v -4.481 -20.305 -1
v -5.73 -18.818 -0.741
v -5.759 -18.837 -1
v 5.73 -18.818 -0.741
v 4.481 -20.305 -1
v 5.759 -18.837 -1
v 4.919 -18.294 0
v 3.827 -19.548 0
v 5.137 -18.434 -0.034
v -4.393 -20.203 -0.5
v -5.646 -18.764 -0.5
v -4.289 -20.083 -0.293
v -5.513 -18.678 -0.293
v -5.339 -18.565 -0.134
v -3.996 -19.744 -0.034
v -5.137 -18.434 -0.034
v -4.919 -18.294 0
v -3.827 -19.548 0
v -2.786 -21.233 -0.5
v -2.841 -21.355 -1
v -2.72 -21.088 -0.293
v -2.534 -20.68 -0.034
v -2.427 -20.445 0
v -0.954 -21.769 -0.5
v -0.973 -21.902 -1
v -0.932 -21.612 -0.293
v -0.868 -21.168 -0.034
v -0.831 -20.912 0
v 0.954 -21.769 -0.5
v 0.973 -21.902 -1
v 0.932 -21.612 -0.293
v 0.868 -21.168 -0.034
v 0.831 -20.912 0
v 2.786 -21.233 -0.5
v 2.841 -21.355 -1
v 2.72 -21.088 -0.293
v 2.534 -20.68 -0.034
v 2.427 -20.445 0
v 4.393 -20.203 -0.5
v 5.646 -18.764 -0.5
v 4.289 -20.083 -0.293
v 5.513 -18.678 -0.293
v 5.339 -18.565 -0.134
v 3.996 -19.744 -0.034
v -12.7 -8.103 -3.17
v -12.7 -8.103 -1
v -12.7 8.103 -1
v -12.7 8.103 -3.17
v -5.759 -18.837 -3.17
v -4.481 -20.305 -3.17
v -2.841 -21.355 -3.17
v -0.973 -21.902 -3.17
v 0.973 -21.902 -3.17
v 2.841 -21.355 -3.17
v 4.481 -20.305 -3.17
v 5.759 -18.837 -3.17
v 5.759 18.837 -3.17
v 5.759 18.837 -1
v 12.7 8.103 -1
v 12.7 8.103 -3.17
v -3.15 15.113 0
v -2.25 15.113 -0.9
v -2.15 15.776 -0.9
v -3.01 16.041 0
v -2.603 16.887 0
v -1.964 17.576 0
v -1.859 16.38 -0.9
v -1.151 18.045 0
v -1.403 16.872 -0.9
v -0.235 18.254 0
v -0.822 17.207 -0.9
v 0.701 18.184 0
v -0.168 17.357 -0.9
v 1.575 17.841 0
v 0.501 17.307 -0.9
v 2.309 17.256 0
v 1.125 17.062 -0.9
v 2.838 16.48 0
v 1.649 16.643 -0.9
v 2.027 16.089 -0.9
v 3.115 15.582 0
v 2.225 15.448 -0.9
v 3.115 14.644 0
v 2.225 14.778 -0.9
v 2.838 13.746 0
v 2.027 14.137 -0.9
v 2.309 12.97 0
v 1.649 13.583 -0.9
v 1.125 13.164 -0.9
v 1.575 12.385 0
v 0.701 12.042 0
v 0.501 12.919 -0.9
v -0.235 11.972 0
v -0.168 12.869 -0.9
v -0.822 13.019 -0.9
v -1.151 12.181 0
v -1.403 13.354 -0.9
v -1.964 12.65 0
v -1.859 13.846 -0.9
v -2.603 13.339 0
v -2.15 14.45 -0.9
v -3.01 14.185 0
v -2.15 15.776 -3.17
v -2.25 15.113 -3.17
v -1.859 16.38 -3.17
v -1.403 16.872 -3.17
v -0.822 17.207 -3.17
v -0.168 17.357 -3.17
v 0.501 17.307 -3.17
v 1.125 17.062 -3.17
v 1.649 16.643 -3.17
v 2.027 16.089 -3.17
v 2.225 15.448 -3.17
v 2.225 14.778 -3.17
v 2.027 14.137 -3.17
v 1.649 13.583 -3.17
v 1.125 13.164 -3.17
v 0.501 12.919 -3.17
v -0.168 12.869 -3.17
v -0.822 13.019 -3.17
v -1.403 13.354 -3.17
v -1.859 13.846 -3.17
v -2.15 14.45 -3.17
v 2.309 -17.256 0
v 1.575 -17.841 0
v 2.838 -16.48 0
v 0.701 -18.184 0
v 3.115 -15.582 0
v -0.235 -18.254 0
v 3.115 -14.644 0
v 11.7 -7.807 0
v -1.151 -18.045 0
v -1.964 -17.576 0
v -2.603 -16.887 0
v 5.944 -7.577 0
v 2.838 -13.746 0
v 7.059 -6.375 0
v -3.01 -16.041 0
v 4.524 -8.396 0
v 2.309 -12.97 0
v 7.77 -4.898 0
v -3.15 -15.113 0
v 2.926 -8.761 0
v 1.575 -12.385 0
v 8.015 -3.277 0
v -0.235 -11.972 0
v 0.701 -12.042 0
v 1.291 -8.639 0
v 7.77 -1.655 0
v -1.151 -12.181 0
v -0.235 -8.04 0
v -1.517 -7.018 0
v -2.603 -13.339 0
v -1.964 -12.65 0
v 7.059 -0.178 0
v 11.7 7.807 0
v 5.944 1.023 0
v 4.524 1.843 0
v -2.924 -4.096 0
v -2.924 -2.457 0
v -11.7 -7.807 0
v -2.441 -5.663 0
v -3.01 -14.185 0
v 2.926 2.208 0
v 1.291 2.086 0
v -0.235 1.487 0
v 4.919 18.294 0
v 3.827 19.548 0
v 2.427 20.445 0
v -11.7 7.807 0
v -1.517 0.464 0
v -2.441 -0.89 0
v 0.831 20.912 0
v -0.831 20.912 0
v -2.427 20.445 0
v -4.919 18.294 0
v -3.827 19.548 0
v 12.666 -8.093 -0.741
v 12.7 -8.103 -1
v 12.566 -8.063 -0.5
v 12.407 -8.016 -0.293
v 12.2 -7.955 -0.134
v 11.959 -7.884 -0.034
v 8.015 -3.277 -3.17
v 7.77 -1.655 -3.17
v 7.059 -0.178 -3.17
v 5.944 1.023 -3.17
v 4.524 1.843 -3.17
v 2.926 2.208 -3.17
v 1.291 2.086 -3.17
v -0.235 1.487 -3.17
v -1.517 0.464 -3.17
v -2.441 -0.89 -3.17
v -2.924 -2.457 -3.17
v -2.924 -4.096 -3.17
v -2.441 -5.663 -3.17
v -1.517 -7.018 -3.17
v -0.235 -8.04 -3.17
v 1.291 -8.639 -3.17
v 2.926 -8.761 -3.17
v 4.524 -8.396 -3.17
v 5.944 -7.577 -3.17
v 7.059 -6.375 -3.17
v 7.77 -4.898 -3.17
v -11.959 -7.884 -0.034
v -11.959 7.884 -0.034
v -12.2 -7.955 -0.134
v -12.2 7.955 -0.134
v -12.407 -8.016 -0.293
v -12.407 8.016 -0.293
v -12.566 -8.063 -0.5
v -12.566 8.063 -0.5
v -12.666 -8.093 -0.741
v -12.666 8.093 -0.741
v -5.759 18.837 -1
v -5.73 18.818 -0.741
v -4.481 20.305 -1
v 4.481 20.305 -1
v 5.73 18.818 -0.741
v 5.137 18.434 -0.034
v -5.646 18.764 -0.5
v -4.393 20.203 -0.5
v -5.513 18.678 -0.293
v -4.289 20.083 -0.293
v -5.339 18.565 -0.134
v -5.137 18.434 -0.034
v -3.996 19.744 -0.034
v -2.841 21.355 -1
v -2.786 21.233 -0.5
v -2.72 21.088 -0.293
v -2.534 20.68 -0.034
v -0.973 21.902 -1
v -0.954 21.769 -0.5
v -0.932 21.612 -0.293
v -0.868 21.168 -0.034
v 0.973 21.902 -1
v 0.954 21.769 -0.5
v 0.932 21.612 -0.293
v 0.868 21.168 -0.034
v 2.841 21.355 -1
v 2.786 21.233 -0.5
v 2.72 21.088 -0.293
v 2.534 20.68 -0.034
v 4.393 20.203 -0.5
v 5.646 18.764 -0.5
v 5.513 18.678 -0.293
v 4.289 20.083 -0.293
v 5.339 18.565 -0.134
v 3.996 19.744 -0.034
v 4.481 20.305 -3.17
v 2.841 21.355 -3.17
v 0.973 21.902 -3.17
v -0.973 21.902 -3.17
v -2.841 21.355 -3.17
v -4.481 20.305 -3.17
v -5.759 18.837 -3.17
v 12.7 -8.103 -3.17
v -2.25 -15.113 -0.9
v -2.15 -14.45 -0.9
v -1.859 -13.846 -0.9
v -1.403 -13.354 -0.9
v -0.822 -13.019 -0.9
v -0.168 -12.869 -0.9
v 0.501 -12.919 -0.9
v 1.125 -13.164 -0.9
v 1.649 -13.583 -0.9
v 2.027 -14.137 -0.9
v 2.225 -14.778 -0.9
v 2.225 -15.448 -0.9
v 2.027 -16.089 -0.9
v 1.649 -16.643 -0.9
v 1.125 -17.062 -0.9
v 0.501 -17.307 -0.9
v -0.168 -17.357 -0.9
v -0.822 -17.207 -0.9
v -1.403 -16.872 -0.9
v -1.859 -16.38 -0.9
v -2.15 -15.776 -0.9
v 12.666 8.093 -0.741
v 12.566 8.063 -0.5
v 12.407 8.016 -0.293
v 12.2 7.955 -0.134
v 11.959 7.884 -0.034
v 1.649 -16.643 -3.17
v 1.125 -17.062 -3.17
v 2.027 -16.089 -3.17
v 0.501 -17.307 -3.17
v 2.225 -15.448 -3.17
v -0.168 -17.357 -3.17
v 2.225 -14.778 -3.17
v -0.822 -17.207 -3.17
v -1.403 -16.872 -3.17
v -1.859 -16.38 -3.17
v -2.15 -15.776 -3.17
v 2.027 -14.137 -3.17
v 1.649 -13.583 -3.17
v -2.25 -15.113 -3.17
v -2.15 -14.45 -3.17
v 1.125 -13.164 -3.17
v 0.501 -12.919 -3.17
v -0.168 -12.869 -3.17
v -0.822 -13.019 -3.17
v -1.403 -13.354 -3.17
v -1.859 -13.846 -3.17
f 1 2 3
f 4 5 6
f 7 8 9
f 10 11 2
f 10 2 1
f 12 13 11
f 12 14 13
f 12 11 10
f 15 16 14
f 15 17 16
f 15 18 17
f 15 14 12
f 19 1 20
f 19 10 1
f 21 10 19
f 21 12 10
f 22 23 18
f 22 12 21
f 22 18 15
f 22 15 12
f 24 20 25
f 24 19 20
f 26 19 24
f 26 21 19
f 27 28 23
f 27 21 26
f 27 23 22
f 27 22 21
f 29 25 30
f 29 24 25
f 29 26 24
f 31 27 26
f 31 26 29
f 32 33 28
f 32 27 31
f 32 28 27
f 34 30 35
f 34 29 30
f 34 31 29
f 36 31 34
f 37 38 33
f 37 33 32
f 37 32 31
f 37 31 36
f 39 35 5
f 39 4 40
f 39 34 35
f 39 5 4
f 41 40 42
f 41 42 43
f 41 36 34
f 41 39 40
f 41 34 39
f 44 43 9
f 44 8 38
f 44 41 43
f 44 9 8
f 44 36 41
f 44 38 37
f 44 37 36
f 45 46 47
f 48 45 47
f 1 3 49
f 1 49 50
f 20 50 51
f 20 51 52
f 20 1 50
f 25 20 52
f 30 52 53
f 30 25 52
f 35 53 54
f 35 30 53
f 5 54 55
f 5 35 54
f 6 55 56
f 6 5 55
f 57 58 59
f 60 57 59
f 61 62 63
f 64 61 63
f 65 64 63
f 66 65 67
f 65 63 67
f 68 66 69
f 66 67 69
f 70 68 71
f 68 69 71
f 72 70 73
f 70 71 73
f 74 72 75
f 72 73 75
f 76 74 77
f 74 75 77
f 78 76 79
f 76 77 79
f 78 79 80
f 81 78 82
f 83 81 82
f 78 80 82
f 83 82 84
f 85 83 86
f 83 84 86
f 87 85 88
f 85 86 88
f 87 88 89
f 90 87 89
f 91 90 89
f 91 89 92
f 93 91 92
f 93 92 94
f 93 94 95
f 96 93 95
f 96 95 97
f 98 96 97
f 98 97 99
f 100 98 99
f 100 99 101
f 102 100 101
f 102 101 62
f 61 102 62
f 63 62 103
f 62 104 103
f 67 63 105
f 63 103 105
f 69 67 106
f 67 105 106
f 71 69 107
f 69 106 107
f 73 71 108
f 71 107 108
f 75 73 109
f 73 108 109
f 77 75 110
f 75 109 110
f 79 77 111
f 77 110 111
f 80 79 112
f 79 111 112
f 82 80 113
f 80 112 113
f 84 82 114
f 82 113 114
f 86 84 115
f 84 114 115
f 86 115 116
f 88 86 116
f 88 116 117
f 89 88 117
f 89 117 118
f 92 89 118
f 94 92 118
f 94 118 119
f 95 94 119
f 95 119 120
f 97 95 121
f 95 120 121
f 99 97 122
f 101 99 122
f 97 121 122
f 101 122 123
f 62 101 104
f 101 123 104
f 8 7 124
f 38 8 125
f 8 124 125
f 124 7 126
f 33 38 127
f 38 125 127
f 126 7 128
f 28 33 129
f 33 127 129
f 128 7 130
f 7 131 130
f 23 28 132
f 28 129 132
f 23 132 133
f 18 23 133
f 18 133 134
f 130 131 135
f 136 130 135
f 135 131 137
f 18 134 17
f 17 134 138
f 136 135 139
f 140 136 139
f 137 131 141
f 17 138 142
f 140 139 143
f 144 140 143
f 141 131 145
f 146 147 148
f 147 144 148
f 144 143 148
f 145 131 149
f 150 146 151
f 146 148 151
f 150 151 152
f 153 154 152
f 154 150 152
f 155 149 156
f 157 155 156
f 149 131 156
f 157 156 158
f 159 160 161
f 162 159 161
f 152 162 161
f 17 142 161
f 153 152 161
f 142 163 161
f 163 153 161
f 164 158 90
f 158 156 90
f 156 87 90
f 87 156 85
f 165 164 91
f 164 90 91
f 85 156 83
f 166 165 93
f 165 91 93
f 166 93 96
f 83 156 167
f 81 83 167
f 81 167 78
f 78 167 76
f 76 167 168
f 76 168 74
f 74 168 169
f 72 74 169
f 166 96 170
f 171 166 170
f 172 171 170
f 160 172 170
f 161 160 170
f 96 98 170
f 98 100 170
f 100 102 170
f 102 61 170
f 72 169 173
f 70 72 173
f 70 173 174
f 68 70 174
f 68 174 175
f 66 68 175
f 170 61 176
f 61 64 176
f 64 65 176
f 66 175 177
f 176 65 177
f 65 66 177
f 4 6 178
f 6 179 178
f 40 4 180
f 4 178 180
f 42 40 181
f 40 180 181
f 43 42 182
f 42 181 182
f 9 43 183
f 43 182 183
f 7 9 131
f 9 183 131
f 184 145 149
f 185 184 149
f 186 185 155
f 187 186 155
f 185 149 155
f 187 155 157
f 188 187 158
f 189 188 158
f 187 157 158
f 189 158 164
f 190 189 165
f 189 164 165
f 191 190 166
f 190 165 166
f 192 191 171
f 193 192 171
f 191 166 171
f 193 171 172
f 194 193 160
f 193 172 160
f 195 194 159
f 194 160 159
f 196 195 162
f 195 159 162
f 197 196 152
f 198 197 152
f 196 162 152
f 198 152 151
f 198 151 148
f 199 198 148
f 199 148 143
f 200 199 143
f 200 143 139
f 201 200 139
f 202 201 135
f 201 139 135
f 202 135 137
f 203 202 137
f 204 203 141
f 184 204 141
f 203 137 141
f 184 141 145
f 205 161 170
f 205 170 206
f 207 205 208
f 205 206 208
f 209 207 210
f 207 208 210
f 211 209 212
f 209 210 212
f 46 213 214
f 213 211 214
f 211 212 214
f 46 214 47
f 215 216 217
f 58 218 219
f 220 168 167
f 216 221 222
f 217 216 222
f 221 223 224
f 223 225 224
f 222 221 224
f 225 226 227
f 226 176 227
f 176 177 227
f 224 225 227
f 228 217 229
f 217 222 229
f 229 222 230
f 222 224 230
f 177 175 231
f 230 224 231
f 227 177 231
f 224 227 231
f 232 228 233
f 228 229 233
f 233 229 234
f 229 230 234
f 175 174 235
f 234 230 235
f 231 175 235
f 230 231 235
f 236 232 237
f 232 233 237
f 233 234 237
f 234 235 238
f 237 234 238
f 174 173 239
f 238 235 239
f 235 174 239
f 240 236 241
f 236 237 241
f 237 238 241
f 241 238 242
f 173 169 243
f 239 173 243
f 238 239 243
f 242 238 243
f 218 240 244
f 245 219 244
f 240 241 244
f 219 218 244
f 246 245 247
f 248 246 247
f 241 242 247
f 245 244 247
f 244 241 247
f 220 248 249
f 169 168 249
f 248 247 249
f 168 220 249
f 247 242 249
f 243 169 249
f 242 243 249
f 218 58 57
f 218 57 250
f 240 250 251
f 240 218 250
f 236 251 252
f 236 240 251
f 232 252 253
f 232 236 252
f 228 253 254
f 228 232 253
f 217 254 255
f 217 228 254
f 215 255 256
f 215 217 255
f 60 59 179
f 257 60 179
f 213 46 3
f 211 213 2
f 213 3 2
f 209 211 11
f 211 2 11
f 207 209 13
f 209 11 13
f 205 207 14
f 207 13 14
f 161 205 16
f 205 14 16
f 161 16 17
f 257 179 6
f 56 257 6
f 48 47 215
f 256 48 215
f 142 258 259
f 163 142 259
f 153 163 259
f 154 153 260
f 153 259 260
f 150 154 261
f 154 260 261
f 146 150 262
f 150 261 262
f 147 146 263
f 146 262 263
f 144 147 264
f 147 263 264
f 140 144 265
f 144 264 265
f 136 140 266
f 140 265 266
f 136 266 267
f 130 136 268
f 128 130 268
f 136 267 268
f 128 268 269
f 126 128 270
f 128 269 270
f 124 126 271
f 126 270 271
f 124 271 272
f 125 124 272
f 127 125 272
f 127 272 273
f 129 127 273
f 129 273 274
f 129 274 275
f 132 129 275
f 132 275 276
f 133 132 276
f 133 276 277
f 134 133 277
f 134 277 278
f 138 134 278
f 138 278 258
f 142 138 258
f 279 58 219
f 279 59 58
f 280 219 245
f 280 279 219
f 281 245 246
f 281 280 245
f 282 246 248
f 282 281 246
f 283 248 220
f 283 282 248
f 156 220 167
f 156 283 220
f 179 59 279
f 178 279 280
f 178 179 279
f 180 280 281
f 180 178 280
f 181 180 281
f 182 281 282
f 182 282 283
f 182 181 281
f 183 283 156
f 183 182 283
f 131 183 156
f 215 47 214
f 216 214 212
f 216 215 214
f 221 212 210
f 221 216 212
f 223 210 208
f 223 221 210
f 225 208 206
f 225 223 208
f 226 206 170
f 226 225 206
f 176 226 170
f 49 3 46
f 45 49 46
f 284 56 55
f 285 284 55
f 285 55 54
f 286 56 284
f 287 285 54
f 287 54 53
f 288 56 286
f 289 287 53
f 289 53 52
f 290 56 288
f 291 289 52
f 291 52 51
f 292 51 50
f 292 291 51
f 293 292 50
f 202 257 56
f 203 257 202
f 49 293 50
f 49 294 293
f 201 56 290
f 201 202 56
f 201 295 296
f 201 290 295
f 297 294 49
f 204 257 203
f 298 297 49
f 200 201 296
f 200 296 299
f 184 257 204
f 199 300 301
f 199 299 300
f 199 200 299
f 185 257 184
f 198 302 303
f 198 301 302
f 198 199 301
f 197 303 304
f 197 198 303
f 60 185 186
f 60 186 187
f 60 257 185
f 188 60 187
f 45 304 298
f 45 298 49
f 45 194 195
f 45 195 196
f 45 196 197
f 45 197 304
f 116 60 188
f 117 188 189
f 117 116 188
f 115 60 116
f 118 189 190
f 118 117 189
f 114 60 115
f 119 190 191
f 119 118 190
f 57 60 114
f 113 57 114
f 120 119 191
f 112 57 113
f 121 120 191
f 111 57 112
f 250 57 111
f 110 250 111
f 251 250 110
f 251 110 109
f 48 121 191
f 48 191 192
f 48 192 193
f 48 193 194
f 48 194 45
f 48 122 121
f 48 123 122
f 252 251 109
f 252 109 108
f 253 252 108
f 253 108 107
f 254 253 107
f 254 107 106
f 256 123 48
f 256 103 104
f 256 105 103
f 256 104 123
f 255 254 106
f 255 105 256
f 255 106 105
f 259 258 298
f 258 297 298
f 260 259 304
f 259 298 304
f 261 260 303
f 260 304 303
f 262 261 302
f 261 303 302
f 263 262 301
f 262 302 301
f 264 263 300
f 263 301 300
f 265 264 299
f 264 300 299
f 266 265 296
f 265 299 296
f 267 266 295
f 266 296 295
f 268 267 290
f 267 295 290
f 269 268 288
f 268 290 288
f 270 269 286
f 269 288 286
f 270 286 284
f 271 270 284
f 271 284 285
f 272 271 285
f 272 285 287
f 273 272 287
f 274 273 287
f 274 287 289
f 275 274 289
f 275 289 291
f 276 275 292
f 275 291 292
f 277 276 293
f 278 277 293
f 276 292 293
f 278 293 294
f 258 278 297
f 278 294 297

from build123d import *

# Parameters (mm, degrees)
SKETCH_R         = 5.5
PAD_DEPTH        = 3.17
HOLE_D           = 4.5
HOLE_DEPTH       = 25
HOLE_CSINK_D     = 6.3
HOLE_CSINK_ANGLE = 90
FILLET_R         = 1


with BuildPart() as part:
    # Sketch → Pad (new body)
    with BuildSketch(Plane.XY):
        with BuildLine():
            Line((-12.7, 8.1026), (-5.758899, 18.836875))
            ThreePointArc((5.758899, 18.836875), (0, 21.971), (-5.758899, 18.836875))
            Line((5.758899, 18.836875), (12.7, 8.1026))
            Line((12.7, 8.1026), (12.7, -8.1026))
            Line((12.7, -8.1026), (5.758899, -18.836875))
            ThreePointArc((-5.758899, -18.836875), (0, -21.971), (5.758899, -18.836875))
            Line((-5.758899, -18.836875), (-12.7, -8.1026))
            Line((-12.7, -8.1026), (-12.7, 8.1026))
        make_face()
        with Locations((2.5146, -3.2766)):
            Circle(SKETCH_R, mode=Mode.SUBTRACT)
    extrude(amount=-PAD_DEPTH)

    # Hole
    with Locations(Plane.XY):
        with Locations((0, 15.113), (0, -15.113)):
            CounterSinkHole(HOLE_D / 2, HOLE_CSINK_D / 2, depth=HOLE_DEPTH, counter_sink_angle=HOLE_CSINK_ANGLE)

    # Fillet
    fillet_edges = [part.edges().sort_by_distance(p)[0] for p in [
        (0, -21.971, 0),
        (12.7, 0, 0),
        (-12.7, 0, 0),
        (-9.22945, 13.469738, 0),
    ]]
    fillet(fillet_edges, radius=FILLET_R)


solid = part.part
